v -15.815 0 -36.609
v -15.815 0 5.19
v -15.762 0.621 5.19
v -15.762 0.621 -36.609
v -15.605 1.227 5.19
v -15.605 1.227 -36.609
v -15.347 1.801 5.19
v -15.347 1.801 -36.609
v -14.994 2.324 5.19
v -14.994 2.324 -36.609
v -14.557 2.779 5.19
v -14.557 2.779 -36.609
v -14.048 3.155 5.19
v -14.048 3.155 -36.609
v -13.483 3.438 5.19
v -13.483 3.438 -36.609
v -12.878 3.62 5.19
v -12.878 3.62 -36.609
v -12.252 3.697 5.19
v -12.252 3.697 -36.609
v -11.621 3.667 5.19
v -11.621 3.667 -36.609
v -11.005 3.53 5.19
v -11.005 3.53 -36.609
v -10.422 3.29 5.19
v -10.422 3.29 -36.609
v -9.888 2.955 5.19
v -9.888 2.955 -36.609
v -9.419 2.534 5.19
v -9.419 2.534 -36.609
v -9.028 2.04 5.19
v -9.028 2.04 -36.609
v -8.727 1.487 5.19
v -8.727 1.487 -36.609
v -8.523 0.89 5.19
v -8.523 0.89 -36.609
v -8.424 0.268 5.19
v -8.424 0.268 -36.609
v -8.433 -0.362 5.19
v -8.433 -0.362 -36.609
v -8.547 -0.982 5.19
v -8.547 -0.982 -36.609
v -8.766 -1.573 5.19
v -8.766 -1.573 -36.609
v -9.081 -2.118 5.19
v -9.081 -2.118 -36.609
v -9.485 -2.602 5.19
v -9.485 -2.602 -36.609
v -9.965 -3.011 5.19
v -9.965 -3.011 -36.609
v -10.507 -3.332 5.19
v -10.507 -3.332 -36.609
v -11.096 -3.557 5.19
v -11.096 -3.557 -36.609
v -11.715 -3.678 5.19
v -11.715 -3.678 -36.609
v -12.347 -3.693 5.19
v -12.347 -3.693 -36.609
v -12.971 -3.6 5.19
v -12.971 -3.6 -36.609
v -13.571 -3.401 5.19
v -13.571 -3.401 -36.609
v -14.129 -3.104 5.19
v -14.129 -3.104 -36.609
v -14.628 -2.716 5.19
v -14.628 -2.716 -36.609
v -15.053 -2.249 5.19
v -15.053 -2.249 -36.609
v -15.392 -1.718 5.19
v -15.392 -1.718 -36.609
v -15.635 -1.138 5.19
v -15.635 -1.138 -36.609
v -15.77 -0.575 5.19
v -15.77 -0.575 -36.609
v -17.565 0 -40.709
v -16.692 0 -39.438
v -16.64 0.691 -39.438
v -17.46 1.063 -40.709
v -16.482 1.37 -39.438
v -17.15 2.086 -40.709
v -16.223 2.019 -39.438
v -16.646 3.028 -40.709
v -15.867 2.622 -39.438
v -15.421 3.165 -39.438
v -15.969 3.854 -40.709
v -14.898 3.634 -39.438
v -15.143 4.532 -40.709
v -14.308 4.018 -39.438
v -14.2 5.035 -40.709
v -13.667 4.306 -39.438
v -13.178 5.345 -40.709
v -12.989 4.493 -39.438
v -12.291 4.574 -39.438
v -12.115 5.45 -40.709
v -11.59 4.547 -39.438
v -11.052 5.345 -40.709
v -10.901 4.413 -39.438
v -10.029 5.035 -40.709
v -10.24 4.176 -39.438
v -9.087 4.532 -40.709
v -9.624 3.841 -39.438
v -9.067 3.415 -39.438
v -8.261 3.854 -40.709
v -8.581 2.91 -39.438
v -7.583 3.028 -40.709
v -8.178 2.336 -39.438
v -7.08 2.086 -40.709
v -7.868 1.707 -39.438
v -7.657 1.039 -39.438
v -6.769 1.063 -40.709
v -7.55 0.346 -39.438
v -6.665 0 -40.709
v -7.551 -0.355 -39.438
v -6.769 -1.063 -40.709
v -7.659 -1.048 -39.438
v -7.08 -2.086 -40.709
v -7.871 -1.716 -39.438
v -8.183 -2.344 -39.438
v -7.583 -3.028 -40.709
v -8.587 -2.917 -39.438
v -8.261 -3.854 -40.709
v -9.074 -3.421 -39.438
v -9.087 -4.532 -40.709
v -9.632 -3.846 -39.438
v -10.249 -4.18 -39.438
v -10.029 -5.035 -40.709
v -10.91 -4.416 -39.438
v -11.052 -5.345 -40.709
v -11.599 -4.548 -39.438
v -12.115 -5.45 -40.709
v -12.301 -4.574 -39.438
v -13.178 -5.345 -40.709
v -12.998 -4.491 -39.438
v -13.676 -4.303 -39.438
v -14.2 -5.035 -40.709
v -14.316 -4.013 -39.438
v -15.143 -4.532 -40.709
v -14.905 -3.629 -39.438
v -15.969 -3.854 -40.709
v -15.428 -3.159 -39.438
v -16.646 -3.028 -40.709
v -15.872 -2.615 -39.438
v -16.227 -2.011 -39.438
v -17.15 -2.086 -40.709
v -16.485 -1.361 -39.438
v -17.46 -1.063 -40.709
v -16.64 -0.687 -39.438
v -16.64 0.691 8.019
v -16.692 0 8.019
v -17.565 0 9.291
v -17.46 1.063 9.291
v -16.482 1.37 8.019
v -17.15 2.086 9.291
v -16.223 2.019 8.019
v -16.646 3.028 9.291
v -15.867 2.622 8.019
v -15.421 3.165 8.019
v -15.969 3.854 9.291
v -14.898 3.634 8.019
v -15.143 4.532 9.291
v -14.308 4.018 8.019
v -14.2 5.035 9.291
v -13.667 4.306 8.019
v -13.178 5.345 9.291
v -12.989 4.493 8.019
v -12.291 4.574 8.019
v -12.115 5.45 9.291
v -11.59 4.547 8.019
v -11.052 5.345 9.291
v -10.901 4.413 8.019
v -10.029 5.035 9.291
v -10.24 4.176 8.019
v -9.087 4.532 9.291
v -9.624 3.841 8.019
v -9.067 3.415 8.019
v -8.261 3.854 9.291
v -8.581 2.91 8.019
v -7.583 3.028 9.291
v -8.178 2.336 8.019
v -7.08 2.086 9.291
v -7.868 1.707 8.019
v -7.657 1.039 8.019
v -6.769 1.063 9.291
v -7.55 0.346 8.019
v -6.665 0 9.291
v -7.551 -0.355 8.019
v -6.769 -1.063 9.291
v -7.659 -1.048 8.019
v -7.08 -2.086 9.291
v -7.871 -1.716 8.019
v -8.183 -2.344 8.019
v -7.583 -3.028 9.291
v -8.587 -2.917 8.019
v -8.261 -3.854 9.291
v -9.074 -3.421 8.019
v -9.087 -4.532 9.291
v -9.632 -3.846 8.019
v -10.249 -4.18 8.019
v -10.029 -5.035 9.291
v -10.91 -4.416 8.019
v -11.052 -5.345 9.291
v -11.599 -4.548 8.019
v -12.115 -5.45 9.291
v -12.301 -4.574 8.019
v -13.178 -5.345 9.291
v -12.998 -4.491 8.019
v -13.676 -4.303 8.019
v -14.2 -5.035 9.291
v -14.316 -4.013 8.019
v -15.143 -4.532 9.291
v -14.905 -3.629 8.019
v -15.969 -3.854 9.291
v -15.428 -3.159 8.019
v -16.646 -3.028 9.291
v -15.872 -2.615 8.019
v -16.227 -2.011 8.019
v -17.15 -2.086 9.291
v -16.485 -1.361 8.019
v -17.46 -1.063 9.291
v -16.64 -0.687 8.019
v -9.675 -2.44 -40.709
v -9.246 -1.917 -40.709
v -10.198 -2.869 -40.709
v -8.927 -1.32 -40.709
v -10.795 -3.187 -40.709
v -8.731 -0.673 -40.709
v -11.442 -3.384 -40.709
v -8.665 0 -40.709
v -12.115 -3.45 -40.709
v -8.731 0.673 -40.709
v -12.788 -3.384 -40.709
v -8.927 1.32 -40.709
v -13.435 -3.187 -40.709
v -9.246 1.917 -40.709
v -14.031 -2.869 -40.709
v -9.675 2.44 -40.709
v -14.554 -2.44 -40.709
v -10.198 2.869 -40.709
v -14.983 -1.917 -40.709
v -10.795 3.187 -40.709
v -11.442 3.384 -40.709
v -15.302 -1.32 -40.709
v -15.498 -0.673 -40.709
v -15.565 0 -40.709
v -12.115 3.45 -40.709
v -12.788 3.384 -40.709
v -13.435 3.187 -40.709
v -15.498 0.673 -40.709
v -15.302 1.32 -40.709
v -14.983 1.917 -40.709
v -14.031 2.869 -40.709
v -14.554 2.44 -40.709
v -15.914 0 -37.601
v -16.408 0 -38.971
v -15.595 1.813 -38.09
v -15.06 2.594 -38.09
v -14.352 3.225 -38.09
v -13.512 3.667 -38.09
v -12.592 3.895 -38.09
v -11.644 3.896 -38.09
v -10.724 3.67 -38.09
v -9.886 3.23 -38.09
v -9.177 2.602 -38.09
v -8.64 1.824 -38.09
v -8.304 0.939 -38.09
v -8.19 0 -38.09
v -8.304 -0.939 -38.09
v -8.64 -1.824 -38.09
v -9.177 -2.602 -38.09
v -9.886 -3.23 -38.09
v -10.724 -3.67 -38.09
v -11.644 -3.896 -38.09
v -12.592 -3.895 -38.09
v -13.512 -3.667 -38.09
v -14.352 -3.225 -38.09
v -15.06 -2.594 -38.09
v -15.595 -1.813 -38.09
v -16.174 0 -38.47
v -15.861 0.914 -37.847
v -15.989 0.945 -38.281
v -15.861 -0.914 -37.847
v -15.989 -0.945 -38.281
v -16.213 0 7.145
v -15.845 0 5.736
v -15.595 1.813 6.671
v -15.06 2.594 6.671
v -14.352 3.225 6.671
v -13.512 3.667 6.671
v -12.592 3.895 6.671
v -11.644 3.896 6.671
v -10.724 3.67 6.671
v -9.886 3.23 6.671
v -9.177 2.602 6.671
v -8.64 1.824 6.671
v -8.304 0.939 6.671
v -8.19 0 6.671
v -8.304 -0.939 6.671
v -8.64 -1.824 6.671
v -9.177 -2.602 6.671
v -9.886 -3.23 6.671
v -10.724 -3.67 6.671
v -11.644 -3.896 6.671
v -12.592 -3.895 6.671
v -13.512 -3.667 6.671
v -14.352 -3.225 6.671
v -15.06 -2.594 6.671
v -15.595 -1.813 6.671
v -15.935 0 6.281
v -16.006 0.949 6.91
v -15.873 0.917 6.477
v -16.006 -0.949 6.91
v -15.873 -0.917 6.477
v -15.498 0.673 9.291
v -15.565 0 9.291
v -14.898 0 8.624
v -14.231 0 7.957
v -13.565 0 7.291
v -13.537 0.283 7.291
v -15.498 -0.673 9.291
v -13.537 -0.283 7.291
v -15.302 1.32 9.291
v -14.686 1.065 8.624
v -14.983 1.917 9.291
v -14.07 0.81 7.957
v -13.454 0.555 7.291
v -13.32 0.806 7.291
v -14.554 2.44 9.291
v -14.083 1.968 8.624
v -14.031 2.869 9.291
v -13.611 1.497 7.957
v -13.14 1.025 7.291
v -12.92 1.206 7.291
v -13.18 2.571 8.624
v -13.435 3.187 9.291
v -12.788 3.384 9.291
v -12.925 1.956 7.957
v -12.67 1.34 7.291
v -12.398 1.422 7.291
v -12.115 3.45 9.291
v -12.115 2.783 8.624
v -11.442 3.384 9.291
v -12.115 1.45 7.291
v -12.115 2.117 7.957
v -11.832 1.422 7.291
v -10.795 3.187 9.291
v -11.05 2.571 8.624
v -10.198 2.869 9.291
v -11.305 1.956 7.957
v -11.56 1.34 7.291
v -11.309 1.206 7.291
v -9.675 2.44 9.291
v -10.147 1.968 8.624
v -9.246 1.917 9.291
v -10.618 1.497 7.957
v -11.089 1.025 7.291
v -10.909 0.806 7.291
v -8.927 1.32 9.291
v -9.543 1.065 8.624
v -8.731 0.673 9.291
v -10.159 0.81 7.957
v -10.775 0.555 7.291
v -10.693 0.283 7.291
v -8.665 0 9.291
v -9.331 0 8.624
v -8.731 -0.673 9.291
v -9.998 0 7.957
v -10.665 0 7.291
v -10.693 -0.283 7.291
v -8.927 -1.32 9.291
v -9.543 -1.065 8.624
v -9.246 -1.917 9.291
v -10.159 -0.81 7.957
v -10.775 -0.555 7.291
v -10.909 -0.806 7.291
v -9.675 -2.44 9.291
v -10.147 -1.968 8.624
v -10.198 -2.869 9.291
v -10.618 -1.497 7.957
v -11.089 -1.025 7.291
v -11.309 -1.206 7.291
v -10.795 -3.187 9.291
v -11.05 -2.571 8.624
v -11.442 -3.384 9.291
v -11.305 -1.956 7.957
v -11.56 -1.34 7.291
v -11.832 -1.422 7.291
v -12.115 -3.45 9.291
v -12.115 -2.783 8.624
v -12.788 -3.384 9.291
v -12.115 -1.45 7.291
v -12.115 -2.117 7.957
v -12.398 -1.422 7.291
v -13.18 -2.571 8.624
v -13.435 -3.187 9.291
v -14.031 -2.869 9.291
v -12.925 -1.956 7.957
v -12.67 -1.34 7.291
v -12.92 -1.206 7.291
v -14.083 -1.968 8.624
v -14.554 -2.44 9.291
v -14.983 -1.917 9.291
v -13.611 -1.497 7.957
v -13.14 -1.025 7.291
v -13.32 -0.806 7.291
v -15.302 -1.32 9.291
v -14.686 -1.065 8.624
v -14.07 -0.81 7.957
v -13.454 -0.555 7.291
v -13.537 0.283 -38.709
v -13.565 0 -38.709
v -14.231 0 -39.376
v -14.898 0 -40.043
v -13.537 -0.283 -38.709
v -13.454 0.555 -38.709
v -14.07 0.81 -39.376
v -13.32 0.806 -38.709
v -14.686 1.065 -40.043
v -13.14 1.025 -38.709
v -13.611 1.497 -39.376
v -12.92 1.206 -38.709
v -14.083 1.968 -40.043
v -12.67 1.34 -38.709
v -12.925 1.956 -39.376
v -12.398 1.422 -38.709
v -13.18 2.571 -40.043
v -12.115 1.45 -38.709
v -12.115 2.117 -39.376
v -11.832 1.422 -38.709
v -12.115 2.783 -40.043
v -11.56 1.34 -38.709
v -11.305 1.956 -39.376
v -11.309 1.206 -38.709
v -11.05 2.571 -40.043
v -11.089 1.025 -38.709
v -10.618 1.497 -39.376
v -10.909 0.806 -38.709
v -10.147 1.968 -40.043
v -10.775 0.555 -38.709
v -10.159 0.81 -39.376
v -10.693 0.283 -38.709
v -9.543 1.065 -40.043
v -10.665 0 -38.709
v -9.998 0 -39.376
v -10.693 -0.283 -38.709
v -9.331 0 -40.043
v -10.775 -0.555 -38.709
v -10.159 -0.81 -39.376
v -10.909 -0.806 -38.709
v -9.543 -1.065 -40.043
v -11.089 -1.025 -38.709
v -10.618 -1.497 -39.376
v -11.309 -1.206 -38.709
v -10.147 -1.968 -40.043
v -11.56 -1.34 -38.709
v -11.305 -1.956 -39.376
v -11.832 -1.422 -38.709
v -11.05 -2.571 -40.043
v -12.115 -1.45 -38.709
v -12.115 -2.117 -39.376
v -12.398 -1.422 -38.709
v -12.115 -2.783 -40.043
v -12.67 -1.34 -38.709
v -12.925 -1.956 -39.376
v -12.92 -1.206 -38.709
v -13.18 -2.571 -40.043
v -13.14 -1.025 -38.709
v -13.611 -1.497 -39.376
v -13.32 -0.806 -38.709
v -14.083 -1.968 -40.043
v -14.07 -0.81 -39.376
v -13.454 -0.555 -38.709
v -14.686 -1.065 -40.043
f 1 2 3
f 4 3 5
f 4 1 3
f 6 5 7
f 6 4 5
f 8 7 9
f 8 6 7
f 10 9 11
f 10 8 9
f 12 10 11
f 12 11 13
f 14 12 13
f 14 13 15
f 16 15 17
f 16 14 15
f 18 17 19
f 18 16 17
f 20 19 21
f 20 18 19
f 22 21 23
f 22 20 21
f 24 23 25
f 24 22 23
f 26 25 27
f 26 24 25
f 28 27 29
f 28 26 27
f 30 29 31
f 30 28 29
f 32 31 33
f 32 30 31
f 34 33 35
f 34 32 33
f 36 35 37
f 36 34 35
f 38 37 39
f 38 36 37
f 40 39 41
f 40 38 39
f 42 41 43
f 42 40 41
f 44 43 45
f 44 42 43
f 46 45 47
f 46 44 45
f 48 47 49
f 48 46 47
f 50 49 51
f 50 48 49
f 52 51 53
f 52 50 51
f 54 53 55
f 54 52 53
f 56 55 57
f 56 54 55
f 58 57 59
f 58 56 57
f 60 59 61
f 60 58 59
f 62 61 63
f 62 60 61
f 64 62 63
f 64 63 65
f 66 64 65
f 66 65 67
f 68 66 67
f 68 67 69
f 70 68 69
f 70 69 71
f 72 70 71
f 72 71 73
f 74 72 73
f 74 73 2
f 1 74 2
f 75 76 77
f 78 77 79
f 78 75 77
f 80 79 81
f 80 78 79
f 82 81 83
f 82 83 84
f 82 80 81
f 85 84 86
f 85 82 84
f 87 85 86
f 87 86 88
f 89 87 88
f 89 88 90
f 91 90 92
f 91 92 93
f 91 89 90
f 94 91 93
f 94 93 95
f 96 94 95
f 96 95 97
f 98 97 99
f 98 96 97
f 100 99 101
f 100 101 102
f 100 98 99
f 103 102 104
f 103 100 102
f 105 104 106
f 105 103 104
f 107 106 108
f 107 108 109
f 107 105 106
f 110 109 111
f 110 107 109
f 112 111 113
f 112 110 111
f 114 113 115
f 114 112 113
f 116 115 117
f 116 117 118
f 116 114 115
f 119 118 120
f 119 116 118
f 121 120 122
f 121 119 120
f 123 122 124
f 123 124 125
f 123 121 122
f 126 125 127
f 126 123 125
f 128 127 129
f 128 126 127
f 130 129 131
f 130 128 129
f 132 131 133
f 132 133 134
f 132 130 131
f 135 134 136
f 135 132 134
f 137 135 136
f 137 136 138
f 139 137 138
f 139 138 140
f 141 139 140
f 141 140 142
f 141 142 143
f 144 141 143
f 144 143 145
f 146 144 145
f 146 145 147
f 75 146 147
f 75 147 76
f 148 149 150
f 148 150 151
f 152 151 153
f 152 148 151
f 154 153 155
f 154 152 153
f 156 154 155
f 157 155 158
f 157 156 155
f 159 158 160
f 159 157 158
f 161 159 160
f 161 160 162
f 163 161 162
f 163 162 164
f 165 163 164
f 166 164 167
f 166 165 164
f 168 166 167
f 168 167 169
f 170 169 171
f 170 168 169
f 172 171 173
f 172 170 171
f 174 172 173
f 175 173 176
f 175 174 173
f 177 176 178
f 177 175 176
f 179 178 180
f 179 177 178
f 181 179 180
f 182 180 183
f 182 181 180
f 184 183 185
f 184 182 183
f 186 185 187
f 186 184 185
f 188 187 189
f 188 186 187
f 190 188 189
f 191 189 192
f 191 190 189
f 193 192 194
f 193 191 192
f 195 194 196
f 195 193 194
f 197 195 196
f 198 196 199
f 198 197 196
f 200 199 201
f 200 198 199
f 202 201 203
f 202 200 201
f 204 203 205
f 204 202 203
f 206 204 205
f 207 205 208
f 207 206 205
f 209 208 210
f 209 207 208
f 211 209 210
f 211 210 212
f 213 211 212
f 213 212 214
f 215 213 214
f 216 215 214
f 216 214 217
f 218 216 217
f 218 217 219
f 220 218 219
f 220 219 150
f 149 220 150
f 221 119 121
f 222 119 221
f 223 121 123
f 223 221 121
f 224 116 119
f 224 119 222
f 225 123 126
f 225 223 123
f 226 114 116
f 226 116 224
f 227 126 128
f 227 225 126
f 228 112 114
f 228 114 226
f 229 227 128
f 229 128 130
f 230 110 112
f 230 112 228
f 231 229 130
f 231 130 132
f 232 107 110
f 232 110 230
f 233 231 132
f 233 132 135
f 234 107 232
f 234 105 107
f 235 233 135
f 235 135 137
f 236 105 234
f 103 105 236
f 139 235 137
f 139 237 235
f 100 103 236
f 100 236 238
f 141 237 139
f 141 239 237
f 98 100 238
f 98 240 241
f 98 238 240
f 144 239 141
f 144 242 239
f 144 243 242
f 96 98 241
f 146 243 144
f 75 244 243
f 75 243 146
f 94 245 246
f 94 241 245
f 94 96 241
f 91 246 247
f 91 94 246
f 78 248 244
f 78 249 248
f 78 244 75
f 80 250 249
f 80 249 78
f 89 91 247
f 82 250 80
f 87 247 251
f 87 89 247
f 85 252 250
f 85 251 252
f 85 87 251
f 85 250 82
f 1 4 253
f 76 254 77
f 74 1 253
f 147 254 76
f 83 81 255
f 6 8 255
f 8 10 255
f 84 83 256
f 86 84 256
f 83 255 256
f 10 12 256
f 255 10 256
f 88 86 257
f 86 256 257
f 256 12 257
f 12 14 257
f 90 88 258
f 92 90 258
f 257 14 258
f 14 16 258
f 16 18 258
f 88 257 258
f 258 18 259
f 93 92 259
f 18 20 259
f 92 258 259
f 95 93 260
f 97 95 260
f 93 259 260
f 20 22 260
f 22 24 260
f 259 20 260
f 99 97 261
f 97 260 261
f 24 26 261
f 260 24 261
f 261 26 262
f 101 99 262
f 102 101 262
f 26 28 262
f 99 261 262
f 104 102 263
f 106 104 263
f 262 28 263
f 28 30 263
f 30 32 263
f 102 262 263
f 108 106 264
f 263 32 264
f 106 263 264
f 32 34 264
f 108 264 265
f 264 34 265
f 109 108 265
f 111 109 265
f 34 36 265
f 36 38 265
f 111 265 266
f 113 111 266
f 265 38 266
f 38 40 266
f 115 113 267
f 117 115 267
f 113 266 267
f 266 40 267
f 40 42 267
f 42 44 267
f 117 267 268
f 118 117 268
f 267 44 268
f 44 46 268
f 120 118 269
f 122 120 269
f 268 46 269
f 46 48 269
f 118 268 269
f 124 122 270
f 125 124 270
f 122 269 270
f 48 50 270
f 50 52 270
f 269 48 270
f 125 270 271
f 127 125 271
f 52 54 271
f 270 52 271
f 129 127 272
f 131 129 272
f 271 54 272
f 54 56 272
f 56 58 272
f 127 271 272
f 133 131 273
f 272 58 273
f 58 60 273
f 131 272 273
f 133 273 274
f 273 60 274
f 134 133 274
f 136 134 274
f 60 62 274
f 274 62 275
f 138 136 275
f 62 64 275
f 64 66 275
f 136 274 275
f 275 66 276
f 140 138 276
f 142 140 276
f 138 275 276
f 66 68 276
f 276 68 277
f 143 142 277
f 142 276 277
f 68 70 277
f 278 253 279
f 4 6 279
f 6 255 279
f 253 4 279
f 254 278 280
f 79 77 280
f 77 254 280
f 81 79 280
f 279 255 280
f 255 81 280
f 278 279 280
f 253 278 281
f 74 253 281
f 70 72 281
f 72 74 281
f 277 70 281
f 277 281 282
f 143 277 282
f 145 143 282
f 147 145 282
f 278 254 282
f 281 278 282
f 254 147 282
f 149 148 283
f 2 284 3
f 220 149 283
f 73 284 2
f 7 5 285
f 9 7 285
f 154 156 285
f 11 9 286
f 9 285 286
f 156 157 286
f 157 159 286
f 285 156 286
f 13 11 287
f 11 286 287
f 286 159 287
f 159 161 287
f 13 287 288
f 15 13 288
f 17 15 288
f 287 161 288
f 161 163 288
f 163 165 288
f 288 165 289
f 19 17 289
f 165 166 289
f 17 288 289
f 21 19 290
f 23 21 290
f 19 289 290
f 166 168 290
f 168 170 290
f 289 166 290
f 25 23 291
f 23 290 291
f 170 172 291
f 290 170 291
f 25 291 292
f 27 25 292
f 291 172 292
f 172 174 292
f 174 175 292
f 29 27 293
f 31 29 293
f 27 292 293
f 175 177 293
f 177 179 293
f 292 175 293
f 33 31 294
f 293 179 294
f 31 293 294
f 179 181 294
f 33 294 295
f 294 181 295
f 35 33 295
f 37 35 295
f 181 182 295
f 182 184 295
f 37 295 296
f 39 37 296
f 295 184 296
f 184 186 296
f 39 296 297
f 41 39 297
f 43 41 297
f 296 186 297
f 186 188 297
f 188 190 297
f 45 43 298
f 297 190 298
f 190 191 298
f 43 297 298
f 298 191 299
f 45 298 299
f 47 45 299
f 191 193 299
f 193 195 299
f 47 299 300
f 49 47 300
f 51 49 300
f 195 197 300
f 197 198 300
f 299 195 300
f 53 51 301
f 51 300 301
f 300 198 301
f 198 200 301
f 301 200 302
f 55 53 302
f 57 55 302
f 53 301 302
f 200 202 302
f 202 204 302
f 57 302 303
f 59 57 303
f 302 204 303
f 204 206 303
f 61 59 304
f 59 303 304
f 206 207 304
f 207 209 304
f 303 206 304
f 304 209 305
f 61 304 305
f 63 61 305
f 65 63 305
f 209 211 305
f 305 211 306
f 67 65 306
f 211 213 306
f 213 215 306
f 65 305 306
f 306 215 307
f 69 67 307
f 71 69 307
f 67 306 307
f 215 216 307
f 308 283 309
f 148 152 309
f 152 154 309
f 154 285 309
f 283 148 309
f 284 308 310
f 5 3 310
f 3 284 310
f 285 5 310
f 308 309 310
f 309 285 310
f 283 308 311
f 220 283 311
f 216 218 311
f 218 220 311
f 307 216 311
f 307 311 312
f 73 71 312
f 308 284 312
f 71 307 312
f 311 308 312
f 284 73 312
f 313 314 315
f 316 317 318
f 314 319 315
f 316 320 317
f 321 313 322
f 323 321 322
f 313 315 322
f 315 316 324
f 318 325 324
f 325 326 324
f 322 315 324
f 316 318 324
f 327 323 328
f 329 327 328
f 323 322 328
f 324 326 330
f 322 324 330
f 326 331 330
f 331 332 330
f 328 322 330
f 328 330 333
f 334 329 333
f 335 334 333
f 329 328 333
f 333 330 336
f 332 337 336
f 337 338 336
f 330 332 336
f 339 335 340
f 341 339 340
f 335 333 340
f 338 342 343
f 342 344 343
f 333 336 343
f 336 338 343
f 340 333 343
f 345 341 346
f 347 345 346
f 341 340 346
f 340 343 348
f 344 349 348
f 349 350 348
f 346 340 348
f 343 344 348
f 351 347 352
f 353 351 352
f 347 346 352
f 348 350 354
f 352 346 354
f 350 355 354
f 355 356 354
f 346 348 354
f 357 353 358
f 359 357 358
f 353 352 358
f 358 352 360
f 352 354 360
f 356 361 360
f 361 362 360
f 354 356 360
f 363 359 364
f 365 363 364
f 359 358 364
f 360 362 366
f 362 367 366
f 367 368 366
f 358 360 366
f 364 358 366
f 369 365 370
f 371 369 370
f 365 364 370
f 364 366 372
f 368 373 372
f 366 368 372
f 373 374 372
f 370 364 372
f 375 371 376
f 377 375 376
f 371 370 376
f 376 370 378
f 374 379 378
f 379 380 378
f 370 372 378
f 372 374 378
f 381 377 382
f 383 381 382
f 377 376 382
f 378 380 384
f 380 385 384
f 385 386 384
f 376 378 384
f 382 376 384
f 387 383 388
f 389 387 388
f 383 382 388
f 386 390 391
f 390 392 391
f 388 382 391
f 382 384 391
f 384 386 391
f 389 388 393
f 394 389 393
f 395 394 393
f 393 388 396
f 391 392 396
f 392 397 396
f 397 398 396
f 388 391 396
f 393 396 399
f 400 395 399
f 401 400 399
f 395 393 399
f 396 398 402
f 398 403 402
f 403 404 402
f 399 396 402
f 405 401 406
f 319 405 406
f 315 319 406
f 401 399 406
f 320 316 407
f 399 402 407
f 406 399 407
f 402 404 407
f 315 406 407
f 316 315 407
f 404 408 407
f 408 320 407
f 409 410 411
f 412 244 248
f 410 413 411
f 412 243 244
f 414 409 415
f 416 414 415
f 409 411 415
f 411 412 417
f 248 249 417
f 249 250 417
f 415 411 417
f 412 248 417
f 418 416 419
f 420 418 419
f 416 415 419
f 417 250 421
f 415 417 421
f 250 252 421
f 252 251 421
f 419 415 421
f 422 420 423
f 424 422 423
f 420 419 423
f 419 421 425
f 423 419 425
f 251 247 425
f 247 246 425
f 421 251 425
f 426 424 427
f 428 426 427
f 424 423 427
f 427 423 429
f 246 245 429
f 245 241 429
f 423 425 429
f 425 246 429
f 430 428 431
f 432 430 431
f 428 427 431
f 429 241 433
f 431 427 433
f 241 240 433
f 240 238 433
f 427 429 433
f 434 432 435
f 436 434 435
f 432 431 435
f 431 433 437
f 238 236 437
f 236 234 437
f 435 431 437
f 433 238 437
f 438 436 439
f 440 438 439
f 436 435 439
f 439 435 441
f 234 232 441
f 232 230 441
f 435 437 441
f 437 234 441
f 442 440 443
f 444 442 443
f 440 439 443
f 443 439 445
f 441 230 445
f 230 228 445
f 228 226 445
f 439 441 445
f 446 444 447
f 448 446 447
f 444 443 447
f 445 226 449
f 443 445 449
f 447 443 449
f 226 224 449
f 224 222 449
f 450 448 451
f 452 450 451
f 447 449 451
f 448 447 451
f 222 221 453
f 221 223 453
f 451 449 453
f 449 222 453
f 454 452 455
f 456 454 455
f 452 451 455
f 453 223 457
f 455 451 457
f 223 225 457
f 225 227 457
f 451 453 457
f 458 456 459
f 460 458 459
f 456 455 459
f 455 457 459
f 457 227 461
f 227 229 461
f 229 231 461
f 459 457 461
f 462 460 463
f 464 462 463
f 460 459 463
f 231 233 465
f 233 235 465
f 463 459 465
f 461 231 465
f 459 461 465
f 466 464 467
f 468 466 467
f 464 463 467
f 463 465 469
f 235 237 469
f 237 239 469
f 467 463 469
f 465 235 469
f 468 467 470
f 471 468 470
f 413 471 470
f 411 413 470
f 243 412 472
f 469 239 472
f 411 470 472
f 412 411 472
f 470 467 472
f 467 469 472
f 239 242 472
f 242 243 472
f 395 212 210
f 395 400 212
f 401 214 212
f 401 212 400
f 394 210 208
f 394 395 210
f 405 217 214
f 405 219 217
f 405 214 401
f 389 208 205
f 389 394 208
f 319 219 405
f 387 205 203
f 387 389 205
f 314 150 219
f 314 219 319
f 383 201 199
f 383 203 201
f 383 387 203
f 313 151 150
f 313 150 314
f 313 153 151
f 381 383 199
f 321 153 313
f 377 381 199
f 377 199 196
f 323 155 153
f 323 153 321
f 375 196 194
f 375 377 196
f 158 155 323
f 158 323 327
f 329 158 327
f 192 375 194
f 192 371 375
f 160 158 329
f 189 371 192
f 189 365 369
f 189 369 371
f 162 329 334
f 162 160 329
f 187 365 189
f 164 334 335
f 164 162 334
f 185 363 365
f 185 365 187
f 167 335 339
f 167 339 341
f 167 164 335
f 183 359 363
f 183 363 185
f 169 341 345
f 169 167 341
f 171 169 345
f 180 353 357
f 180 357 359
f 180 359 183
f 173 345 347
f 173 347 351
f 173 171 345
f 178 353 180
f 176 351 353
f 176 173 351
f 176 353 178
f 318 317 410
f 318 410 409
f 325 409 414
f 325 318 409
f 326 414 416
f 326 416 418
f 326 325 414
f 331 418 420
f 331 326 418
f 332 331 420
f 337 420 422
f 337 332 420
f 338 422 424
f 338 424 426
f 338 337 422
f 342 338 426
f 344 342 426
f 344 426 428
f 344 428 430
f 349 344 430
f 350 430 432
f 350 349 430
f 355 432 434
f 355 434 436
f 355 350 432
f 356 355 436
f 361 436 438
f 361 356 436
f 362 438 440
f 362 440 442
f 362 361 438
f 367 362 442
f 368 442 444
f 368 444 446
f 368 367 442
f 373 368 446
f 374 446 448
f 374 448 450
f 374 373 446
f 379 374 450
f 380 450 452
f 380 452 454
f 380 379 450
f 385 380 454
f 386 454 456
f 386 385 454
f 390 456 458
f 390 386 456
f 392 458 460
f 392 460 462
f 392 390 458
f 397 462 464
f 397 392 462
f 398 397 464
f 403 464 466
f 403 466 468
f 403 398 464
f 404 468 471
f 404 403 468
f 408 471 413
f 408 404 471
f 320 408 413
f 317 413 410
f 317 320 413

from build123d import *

# Parameters (mm, degrees)
F2_R     = 5
F3_SIZE2 = 2
F3_SIZE  = 2


with BuildPart() as f1:
    # F0 (on Front) → F1 (revolve)
    with BuildSketch(Plane.XZ):
        Polygon((-13.5647695723, 9.2907883497), (-17.5647695723, 9.2907883497), (-15.8147693879, 6.7407885124), (-15.8147693879, -15.7092116503), (-13.5647695723, -15.7092116503), align=None)
        Polygon((-13.5647695723, -40.7092116503), (-13.5647695723, -15.7092116503), (-15.8147693879, -15.7092116503), (-15.8147693879, -38.159211813), (-17.5647695723, -40.7092116503), align=None)
    revolve(axis=Axis((-12.1147695723, 0, -13.6592119893), (0, 0, -1)))

    # F2
    f2_edges = [f1.edges().sort_by_distance(p)[0] for p in [
        (-8.41477, 0, 6.740789),
        (-8.41477, 0, -38.159212),
    ]]
    fillet(f2_edges, radius=F2_R)

    # F3
    f3_edges = [f1.edges().sort_by_distance(p)[0] for p in [
        (-10.66477, 0, 9.290788),
        (-10.66477, 0, -40.709212),
    ]]
    chamfer(f3_edges, length=F3_SIZE, length2=F3_SIZE2)


solid = f1.part
